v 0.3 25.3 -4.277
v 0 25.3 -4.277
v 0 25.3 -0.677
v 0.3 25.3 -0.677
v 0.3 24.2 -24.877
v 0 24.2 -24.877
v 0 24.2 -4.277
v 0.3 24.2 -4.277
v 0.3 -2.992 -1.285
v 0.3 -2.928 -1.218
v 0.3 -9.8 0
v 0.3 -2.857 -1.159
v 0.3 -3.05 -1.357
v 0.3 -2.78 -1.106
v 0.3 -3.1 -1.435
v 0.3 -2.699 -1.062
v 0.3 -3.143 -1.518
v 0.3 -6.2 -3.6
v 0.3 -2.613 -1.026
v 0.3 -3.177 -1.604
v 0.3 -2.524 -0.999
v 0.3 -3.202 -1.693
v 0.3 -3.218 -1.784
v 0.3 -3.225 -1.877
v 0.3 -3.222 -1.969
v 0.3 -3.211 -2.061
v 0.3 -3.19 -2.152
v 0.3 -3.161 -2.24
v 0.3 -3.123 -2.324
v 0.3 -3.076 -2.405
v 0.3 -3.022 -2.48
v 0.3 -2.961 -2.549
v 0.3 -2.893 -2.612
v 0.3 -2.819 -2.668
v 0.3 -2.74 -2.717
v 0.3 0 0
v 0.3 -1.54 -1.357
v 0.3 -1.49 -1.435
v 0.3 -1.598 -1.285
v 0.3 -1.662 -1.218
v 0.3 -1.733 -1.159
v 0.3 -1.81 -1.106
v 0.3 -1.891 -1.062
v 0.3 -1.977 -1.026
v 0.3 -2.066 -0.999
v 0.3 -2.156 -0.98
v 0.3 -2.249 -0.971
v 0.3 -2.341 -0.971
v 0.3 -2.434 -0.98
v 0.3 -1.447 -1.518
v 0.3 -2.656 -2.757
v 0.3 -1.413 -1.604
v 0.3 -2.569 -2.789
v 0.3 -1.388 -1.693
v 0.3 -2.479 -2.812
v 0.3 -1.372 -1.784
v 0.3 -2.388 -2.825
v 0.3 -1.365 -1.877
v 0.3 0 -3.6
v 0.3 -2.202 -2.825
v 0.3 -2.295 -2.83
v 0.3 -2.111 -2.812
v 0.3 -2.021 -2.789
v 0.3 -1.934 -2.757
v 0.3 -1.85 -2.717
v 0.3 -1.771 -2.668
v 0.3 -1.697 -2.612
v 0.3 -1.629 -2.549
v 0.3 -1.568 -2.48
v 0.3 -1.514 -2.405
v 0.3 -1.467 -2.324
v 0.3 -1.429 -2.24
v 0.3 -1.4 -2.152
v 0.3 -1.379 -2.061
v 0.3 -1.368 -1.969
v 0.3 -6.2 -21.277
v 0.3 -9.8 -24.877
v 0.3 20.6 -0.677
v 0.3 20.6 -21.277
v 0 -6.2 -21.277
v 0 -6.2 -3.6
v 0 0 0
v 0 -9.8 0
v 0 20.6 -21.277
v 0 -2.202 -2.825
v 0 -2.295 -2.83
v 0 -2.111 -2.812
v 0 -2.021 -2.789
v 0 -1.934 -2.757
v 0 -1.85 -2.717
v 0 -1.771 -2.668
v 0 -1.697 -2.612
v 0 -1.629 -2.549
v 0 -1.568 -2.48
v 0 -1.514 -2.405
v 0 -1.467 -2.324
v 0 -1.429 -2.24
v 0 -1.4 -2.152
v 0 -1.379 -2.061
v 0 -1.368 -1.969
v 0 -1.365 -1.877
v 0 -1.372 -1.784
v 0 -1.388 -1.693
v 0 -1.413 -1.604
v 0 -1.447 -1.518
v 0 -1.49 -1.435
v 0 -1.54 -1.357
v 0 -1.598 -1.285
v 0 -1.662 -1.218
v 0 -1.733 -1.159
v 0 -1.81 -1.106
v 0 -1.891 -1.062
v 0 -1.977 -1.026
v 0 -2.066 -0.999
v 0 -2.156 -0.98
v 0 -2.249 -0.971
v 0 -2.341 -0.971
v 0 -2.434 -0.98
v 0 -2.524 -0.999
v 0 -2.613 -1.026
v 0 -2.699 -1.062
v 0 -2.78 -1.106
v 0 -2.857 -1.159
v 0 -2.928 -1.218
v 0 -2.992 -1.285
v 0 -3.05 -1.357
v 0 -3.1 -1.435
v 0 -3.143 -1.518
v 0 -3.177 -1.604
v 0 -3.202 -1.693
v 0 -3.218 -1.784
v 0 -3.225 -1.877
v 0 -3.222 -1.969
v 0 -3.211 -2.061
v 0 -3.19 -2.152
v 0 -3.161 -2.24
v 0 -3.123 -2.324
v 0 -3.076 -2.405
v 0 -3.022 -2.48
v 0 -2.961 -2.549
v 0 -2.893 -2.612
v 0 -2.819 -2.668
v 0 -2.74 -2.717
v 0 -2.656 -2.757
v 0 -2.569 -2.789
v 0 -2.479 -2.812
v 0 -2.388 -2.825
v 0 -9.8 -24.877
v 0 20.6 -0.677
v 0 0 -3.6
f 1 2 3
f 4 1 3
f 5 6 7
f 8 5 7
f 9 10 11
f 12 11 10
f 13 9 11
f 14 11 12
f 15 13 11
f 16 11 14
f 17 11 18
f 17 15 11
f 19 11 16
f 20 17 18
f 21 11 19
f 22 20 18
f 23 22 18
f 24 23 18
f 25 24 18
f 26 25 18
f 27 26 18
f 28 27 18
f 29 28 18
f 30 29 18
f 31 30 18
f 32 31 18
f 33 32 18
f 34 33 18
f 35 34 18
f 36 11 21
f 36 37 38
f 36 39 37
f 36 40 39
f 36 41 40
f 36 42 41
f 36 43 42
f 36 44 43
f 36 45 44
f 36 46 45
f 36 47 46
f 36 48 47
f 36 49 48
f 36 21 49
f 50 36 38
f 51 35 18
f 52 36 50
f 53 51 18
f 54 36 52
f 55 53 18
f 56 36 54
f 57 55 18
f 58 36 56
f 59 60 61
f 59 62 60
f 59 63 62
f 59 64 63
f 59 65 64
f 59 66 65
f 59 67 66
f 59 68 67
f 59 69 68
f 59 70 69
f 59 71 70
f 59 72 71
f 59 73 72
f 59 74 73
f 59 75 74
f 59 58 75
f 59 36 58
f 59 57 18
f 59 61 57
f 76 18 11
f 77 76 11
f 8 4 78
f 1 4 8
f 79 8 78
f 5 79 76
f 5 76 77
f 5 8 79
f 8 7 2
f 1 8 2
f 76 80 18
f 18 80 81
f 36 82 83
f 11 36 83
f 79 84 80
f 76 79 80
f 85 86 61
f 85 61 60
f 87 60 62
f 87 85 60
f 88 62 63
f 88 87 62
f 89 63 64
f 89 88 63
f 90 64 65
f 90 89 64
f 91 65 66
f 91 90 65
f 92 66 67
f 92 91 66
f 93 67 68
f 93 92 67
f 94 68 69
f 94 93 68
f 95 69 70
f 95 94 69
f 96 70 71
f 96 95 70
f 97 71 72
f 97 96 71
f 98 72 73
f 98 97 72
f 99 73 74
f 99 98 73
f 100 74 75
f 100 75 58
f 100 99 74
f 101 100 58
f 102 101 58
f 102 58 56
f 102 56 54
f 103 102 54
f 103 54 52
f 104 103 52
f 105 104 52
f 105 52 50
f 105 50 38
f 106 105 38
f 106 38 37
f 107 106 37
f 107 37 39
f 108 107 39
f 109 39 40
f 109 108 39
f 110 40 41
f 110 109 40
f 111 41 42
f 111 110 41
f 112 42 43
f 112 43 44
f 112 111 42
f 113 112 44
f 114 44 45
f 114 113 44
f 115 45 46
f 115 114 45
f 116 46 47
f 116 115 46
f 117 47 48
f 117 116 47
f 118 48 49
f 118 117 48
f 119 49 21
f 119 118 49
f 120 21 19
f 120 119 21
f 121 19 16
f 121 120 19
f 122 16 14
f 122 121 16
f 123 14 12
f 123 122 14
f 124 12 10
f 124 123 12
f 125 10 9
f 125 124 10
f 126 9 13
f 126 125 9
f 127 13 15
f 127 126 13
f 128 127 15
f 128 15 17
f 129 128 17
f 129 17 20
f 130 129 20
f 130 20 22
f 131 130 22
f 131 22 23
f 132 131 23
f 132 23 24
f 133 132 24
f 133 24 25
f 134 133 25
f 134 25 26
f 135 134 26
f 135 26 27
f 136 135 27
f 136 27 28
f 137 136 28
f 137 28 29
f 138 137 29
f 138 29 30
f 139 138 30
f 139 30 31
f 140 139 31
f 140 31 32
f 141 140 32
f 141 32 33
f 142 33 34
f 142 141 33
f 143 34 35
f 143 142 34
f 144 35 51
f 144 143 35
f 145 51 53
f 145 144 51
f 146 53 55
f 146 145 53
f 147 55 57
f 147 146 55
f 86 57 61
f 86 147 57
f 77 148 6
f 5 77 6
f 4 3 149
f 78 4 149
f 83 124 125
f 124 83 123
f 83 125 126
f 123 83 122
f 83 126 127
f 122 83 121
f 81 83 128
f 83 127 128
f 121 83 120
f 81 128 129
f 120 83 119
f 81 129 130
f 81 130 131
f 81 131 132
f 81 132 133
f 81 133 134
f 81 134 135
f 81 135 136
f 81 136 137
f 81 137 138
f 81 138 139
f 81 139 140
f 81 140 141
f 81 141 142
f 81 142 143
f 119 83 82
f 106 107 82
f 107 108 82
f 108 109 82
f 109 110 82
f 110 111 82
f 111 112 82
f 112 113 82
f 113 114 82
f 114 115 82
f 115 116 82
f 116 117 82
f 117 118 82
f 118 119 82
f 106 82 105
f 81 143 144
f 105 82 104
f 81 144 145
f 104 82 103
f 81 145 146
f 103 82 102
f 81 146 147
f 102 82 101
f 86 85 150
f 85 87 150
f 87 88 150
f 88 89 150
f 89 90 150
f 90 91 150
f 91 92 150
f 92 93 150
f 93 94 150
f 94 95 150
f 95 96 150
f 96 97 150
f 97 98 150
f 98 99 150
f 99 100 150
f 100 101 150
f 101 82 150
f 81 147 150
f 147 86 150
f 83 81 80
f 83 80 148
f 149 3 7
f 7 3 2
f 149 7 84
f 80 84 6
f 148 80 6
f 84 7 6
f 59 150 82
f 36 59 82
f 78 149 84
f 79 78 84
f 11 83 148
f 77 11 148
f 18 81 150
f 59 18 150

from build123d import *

# Parameters (mm, degrees)
SKETCH2_R           = 0.93
BOSS_EXTRUDE1_DEPTH = 0.3


with BuildPart() as part:
    # Sketch2 → Boss-Extrude1 (new body)
    with BuildSketch(Plane(origin=(0, 0, 0), x_dir=(0, 0, -1), z_dir=(1, 0, 0))):
        Polygon((0, 0), (0, -9.8), (24.8771, -9.8), (24.8771, 24.2), (4.2771, 24.2), (4.2771, 25.3), (0.6771, 25.3), (0.6771, 20.6), (21.2771, 20.6), (21.2771, -6.2), (3.6, -6.2), (3.6, 0), align=None)
        with Locations((1.9, -2.295)):
            Circle(SKETCH2_R, mode=Mode.SUBTRACT)
    extrude(amount=BOSS_EXTRUDE1_DEPTH)


solid = part.part
